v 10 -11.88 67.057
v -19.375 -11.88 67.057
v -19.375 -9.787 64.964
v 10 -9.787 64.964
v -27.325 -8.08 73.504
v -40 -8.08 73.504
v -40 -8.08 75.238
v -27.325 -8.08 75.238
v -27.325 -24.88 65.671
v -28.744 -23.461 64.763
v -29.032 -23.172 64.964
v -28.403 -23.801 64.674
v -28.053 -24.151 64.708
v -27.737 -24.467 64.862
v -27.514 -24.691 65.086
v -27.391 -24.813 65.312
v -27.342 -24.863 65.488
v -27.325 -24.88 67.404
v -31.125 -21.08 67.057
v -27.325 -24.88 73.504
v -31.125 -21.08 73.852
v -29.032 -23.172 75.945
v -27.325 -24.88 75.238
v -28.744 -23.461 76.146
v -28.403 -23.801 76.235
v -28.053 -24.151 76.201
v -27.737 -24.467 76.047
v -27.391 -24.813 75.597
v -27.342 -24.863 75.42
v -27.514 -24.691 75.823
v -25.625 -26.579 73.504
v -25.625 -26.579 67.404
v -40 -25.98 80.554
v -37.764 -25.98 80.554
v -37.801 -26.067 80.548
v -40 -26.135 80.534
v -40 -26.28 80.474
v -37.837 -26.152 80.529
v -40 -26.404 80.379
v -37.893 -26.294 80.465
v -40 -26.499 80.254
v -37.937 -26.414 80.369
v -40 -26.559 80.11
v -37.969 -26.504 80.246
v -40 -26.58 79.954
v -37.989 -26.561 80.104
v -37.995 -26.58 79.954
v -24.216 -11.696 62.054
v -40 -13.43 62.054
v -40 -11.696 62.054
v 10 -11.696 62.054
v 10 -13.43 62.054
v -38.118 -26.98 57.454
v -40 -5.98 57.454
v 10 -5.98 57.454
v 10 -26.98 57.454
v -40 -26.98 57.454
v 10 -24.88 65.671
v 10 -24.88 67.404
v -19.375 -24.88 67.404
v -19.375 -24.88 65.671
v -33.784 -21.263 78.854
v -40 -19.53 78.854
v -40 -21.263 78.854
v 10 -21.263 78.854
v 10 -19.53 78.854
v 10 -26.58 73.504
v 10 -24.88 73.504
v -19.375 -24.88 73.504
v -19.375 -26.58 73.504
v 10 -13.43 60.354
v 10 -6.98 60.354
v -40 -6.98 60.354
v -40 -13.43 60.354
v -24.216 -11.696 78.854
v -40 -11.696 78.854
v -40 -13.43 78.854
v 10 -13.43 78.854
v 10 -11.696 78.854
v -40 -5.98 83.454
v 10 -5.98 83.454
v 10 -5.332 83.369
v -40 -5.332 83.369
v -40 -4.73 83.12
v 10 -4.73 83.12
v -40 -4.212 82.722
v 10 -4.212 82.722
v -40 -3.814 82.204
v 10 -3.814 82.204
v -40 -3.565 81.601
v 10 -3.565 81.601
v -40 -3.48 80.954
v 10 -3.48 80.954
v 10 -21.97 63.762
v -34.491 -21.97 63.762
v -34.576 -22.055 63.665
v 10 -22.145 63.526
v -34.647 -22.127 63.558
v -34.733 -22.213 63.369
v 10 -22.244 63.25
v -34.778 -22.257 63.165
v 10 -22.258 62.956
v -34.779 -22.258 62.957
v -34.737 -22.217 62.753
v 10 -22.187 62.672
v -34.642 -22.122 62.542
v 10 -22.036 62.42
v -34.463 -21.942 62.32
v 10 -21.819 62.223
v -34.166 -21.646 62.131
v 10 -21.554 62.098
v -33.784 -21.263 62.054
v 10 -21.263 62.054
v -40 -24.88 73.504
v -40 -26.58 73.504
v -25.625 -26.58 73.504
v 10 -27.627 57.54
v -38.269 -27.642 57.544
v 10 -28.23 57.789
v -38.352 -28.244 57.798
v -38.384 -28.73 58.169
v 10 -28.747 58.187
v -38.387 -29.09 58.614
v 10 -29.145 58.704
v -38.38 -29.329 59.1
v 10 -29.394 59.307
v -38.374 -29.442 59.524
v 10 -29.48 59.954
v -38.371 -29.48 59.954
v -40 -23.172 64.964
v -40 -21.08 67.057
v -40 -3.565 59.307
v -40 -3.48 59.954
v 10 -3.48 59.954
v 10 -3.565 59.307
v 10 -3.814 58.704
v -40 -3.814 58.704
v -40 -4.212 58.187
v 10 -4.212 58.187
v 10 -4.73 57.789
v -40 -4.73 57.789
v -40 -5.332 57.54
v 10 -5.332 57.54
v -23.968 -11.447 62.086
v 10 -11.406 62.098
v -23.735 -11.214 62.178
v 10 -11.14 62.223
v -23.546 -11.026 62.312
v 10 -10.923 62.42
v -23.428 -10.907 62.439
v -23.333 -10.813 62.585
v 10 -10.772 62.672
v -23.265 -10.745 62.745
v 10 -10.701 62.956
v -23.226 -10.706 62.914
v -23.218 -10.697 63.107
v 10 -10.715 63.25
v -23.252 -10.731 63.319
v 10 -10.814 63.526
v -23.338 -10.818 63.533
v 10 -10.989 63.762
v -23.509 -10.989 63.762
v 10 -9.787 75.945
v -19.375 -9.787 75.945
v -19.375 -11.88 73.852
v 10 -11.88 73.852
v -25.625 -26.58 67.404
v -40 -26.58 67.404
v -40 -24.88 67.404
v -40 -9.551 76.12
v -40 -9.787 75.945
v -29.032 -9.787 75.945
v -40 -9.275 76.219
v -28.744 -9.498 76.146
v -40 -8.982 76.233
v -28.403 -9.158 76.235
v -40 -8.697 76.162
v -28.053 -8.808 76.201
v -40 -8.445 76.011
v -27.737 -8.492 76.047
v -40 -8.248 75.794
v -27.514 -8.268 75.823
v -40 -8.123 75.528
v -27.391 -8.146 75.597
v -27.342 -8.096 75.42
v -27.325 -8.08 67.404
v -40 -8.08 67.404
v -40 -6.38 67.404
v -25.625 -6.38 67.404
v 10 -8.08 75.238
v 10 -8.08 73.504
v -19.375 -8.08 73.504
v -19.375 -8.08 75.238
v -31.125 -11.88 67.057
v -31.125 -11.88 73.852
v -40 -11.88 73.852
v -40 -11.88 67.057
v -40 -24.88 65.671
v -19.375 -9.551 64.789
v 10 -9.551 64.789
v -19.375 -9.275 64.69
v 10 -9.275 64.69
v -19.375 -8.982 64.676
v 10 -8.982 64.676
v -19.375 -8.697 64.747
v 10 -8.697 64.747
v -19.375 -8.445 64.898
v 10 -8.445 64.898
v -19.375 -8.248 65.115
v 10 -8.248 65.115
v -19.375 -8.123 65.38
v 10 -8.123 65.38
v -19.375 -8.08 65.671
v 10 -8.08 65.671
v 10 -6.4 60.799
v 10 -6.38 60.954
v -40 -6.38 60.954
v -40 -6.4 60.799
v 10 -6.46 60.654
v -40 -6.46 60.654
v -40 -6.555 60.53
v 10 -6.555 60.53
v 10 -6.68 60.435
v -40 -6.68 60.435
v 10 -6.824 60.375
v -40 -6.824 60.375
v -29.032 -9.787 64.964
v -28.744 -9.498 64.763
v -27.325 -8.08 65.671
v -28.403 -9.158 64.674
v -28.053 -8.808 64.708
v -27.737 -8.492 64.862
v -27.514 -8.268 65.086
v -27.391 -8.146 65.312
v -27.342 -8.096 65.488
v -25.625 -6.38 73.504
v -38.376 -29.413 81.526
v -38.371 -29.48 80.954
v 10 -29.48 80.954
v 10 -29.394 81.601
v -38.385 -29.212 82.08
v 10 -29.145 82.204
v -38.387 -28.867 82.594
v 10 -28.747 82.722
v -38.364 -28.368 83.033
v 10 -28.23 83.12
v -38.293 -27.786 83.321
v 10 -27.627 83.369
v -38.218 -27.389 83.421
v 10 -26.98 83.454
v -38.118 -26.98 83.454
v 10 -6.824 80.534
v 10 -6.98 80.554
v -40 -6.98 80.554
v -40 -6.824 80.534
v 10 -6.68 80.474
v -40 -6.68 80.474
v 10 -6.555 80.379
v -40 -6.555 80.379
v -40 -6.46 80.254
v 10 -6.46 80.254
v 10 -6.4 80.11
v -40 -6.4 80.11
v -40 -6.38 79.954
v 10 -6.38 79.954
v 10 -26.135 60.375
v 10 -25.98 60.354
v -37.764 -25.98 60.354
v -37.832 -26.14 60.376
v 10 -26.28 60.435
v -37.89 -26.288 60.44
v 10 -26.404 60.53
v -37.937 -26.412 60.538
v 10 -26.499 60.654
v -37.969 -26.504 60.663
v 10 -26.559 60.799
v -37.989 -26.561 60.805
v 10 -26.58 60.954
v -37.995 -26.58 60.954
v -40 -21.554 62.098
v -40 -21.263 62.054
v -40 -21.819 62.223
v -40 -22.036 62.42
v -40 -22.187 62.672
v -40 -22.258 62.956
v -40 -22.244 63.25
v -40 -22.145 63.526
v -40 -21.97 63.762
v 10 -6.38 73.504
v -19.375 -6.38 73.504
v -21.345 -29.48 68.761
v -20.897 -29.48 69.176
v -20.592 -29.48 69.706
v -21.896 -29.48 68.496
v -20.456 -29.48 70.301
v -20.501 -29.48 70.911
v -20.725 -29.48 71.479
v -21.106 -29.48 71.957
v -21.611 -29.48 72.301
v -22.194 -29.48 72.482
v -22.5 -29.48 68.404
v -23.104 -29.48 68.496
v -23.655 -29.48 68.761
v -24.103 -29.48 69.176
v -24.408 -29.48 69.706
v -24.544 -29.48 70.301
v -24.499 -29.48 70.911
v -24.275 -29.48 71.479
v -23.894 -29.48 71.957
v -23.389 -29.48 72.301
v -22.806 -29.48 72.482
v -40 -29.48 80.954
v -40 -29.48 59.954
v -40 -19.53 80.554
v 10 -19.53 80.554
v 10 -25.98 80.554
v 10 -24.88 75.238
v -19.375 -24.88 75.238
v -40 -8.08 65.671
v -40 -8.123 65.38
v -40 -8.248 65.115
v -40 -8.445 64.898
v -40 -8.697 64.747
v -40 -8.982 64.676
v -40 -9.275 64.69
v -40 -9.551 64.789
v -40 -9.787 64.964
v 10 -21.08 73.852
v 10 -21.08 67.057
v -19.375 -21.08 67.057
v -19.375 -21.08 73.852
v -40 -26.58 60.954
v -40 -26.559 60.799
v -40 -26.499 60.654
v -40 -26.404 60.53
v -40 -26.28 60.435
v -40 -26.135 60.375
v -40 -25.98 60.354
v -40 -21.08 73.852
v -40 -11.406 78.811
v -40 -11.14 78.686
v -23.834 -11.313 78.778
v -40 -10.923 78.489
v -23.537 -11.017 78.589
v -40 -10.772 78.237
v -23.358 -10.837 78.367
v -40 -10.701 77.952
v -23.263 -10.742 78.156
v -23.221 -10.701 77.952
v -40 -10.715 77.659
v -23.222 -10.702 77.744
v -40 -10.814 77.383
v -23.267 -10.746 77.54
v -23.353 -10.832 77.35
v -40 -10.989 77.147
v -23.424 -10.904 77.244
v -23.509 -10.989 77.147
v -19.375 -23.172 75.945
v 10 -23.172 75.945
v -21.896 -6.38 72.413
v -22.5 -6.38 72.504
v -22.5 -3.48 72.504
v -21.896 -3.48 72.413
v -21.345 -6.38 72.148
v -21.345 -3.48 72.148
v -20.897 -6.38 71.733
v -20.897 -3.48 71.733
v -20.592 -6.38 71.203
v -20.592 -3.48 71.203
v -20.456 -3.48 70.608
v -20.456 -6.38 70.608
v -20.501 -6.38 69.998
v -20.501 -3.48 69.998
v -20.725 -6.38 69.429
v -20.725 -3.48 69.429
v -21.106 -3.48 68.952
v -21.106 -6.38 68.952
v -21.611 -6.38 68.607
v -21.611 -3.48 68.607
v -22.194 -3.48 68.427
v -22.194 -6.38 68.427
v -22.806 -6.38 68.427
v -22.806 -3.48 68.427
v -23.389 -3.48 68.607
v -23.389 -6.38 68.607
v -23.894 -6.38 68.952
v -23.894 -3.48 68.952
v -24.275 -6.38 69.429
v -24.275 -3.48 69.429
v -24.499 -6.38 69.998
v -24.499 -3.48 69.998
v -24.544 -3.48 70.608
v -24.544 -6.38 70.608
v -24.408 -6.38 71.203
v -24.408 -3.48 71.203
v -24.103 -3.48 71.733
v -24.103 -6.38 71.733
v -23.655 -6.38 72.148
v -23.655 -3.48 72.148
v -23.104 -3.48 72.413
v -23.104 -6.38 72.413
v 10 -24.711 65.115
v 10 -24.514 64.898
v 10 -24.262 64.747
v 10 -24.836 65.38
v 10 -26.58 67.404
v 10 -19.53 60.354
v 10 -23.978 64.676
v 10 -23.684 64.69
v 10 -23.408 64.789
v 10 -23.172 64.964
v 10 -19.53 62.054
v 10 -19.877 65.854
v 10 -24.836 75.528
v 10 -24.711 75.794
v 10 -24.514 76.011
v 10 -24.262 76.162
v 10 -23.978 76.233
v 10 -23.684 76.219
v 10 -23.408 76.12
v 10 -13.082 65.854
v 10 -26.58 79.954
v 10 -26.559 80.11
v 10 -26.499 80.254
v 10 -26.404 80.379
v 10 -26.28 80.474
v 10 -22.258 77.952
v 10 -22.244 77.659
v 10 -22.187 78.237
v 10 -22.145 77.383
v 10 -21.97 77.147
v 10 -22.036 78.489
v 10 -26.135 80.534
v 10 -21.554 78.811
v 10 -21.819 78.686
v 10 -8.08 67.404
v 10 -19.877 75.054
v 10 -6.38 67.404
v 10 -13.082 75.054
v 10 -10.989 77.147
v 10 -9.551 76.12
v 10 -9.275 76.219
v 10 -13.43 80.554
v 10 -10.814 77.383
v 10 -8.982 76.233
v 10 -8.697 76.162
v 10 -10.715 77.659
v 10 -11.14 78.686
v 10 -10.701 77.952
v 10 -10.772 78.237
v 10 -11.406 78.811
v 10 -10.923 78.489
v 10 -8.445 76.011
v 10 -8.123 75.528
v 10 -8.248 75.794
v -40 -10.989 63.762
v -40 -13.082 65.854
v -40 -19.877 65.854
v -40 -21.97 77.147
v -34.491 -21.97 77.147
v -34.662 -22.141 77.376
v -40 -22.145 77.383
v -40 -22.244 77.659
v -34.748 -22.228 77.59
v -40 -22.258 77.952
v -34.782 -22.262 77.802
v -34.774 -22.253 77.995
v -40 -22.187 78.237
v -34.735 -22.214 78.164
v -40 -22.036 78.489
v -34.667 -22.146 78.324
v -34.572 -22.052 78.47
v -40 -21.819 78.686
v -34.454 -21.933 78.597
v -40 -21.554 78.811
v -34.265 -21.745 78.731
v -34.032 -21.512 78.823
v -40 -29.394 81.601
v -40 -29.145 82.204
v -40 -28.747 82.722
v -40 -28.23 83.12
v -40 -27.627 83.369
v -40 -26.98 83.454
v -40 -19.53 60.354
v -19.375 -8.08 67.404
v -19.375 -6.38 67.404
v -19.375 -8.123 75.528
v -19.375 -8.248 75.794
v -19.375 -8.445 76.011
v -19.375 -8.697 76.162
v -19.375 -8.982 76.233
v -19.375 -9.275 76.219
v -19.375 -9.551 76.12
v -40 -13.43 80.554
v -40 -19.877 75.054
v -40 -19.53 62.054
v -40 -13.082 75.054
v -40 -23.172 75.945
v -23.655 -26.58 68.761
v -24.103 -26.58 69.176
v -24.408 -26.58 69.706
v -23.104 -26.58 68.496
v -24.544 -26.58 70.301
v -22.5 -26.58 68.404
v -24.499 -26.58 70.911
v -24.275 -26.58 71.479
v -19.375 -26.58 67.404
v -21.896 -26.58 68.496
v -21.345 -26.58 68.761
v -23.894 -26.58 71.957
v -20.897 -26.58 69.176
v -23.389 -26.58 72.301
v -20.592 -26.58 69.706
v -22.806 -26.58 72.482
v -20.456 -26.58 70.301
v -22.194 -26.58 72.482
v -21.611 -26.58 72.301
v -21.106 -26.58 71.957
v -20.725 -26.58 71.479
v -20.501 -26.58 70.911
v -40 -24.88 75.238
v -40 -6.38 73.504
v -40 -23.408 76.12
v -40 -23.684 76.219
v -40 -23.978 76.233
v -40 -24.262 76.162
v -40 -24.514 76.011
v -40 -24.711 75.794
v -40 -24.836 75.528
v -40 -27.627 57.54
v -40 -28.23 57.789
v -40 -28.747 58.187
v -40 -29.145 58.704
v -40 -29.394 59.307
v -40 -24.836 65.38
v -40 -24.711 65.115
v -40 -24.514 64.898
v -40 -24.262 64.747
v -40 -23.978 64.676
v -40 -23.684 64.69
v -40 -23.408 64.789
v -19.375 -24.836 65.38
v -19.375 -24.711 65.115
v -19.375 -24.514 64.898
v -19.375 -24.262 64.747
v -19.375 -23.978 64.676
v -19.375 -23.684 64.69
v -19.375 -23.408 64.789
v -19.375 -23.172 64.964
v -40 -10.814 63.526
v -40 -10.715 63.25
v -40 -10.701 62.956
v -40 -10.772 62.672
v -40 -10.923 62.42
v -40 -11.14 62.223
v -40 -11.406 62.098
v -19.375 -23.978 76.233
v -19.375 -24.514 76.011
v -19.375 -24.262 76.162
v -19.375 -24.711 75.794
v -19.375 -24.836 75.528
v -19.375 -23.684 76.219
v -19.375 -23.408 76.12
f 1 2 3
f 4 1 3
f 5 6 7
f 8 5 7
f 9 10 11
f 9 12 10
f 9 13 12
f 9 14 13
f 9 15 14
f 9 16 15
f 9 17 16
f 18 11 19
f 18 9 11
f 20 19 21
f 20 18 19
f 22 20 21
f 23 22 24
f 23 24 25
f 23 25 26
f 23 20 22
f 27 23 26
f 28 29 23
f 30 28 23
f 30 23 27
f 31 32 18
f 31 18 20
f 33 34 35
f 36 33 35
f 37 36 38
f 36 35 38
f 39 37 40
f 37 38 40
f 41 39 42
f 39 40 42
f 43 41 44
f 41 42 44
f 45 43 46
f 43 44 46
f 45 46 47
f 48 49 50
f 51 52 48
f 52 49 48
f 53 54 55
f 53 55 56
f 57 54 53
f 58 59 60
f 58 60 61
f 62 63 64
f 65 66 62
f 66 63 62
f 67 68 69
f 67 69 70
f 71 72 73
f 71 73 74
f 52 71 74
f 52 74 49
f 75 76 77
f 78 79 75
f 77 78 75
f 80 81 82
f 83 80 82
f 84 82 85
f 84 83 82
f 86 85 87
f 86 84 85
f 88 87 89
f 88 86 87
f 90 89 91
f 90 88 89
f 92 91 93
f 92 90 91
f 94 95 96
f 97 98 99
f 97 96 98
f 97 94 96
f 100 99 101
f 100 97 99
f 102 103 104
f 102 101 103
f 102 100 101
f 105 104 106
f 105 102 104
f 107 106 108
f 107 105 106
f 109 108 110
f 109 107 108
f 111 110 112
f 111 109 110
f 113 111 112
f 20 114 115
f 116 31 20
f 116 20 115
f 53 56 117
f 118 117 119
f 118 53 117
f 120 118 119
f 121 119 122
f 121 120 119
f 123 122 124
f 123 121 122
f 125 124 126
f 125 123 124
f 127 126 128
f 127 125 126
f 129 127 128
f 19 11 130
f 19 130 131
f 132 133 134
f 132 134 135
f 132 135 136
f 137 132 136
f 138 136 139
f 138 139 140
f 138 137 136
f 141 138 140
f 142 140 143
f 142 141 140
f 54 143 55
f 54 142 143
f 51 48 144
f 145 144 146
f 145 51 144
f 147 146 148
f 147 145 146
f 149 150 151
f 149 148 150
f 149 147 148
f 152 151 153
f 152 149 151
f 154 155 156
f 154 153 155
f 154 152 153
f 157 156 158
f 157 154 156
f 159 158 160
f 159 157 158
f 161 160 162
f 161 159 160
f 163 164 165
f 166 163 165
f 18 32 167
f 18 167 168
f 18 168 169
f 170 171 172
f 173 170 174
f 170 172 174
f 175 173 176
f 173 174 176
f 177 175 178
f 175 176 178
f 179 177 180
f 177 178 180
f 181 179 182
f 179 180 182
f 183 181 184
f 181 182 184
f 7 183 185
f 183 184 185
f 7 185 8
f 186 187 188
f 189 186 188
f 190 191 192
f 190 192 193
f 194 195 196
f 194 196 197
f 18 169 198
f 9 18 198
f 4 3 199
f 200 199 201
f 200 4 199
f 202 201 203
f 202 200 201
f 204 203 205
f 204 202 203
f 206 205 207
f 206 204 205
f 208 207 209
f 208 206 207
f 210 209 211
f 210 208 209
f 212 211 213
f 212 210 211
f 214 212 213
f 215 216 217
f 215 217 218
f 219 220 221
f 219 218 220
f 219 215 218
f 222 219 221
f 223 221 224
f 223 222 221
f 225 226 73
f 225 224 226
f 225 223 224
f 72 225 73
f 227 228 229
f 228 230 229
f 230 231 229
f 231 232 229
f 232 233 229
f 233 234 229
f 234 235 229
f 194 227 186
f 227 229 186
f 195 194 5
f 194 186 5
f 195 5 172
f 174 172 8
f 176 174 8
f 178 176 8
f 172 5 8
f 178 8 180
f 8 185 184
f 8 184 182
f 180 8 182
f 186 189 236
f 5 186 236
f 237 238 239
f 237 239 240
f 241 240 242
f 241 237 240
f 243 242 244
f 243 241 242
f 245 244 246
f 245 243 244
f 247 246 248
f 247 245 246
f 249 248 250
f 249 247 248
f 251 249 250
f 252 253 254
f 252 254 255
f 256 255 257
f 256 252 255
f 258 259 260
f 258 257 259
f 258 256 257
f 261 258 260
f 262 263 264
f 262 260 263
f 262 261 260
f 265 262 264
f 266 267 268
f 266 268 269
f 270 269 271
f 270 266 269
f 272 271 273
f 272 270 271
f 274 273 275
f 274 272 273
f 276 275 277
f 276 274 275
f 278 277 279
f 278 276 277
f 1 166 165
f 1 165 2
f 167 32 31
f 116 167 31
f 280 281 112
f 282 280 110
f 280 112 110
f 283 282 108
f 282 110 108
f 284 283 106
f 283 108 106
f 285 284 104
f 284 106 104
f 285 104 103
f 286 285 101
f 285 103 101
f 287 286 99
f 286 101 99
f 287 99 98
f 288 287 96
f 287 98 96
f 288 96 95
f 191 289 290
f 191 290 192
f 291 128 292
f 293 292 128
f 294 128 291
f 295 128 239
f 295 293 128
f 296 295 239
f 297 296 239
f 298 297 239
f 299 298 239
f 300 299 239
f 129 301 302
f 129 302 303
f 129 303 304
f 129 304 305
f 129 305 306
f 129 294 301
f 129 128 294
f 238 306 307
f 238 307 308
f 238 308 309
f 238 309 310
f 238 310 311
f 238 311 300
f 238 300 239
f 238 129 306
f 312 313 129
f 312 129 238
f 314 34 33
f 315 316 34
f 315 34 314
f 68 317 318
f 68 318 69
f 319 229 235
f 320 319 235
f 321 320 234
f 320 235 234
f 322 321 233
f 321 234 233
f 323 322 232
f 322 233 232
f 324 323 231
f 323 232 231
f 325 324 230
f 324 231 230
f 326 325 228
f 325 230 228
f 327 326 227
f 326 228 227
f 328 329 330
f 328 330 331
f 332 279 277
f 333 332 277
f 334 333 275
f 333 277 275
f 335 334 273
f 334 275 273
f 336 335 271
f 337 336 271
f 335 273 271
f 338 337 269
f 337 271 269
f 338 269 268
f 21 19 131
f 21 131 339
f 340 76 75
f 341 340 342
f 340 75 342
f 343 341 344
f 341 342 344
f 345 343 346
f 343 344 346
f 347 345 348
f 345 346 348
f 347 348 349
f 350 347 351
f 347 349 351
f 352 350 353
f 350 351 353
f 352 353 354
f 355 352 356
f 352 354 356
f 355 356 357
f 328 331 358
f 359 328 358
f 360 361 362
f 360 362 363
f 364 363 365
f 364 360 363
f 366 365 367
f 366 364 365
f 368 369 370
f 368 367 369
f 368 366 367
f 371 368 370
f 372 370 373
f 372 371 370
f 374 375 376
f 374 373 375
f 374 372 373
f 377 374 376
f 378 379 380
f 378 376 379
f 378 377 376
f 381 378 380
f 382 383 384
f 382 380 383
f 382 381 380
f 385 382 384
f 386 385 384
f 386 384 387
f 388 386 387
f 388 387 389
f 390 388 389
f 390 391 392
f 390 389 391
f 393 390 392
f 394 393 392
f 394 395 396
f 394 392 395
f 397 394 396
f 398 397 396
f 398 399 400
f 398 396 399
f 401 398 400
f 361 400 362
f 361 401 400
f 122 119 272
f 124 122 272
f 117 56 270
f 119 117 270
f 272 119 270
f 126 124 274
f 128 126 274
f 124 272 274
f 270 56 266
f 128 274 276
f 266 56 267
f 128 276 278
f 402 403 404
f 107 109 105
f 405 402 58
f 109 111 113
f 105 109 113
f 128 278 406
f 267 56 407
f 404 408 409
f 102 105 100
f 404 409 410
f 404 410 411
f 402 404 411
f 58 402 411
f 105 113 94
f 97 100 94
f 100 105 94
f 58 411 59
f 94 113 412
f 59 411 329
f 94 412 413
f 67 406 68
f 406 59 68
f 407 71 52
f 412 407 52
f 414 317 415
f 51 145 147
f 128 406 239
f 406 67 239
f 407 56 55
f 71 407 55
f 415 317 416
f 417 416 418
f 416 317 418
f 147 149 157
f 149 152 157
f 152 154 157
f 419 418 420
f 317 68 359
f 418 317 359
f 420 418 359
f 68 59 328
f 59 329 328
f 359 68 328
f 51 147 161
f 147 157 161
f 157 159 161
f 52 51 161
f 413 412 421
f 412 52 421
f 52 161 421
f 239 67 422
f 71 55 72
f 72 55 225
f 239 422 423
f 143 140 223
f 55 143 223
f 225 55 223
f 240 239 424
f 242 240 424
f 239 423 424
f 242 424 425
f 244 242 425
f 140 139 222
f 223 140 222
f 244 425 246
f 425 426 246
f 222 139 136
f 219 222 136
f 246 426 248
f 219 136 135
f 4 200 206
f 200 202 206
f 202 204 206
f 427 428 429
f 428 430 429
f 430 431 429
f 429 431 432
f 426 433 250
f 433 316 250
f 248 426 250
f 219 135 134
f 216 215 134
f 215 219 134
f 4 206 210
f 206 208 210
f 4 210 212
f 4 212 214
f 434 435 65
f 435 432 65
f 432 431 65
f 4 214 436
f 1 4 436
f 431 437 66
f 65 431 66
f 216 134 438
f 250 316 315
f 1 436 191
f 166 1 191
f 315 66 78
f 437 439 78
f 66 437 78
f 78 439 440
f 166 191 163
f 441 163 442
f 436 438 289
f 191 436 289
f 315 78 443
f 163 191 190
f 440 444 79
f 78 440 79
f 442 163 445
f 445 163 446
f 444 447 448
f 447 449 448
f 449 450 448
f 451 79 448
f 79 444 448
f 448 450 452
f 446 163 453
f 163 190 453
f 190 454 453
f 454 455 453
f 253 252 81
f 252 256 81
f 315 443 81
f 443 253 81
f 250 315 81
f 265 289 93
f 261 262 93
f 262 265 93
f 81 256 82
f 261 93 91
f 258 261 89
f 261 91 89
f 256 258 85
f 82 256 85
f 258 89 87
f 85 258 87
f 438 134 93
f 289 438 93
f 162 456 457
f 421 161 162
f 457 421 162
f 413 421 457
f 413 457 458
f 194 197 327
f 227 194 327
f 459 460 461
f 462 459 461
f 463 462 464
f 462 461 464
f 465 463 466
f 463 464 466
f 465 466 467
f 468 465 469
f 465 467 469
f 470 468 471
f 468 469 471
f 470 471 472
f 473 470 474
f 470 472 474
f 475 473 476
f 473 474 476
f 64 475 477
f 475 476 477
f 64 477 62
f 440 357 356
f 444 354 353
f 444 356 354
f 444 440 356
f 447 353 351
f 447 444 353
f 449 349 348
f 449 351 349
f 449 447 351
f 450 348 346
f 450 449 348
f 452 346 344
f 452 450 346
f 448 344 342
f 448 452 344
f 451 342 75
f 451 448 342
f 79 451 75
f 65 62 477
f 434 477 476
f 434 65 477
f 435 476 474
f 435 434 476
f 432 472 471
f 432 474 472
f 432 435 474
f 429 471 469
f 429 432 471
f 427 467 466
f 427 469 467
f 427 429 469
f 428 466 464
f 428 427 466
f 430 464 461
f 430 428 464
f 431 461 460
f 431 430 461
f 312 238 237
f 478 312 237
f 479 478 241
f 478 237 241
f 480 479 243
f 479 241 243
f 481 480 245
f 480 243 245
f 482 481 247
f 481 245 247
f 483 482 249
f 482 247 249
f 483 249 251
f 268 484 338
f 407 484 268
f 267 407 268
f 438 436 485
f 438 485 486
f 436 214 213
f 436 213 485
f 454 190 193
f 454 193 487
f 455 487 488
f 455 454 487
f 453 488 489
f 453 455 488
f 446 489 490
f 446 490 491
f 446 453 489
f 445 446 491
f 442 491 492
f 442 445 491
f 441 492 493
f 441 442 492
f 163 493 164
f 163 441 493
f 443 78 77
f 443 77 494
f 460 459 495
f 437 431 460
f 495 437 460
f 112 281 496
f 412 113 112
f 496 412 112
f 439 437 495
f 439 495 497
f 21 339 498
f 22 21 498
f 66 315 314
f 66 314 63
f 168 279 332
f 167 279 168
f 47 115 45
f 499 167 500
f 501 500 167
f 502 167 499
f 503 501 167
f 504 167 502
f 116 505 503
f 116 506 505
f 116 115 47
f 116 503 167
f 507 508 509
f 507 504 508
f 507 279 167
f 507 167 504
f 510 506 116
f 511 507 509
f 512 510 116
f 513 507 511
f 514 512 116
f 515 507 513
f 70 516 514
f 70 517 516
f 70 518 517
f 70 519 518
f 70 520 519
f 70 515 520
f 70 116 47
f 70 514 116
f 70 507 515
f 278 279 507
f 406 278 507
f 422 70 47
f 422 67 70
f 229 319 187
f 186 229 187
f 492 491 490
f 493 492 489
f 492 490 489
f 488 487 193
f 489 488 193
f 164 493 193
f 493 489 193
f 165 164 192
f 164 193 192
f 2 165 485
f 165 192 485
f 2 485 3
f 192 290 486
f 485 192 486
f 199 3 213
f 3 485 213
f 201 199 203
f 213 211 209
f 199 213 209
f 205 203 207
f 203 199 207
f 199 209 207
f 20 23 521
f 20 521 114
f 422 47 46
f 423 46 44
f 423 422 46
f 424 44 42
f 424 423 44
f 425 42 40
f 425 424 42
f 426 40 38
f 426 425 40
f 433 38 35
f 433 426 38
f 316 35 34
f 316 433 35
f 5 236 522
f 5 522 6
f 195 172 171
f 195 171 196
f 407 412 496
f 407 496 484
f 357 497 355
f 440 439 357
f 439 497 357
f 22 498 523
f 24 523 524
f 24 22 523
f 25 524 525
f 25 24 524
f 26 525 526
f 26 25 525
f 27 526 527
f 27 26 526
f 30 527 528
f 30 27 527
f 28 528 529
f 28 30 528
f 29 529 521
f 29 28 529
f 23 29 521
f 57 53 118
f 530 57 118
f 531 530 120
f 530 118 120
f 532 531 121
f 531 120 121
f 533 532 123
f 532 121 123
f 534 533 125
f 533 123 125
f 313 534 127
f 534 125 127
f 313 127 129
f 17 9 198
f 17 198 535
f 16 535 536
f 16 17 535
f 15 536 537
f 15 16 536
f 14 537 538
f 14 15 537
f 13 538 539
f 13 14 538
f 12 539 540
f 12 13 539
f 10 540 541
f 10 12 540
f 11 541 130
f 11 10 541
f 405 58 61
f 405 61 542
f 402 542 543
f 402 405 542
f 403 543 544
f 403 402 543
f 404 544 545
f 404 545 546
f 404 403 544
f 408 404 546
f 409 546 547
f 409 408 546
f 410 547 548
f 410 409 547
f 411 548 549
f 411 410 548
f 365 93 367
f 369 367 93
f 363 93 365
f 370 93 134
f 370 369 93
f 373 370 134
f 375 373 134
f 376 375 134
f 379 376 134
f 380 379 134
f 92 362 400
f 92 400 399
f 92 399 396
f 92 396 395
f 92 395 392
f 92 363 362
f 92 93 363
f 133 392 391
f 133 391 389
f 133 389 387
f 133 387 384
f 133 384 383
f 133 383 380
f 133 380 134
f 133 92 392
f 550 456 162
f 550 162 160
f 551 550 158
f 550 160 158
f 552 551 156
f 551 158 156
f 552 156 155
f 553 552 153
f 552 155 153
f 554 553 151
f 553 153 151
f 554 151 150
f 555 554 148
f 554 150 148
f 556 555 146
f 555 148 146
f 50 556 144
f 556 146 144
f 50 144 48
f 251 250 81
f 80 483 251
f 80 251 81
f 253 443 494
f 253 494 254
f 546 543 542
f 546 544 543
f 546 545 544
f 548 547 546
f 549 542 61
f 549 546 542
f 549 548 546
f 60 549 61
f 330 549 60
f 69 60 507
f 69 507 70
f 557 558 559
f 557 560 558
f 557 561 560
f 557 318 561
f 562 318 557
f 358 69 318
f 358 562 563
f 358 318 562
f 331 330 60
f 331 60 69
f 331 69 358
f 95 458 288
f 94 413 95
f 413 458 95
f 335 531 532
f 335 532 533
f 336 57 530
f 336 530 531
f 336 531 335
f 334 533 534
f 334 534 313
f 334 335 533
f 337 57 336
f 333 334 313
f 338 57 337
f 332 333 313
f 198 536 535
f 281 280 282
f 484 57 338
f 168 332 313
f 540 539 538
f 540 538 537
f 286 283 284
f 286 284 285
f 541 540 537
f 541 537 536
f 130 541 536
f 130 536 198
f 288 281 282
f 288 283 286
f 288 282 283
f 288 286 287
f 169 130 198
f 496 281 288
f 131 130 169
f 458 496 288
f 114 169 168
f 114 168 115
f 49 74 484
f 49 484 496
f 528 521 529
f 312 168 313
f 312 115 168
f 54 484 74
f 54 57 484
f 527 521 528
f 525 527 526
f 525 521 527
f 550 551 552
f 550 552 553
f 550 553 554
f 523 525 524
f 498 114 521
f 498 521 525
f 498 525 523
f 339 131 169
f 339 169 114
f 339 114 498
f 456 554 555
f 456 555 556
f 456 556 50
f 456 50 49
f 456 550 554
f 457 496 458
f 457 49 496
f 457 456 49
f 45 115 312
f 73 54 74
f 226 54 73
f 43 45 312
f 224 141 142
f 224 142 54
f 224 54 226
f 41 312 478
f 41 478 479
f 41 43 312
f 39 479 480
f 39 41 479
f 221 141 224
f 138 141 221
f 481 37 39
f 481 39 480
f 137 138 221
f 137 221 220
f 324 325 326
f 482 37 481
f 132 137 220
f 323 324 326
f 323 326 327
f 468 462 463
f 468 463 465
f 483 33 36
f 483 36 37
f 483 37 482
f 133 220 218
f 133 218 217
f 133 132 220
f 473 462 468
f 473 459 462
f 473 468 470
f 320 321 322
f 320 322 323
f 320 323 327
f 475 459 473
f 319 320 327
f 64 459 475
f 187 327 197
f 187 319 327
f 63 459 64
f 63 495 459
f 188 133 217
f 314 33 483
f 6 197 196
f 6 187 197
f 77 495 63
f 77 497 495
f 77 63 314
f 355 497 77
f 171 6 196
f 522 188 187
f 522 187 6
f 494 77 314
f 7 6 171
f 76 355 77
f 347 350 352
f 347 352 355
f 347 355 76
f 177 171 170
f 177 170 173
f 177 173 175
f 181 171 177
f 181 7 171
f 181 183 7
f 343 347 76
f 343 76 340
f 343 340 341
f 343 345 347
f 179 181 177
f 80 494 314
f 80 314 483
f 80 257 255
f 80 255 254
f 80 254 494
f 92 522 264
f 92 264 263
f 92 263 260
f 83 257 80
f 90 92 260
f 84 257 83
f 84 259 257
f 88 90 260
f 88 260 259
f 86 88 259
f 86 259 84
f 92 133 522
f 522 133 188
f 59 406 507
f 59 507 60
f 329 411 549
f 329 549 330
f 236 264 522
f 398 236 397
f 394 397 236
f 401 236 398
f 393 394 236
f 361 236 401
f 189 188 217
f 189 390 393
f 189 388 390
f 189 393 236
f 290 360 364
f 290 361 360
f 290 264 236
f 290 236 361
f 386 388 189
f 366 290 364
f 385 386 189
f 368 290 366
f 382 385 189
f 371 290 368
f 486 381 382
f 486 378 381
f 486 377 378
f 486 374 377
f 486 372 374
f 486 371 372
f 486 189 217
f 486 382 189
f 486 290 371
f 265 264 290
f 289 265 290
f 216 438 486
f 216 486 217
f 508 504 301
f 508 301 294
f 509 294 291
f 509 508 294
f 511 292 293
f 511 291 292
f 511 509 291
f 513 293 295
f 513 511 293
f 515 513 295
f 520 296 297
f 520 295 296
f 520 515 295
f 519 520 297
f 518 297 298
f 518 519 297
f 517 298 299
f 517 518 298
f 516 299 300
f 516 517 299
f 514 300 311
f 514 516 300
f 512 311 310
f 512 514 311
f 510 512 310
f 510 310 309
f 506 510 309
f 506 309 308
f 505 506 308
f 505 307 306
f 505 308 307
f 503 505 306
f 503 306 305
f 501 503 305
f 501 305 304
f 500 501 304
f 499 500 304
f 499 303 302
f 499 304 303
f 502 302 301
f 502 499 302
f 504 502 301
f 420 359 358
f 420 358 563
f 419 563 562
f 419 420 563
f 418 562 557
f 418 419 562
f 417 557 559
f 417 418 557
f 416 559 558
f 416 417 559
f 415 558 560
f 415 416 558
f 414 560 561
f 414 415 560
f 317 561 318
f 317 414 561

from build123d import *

# Parameters (mm, degrees)
BOSS_EXTRUDE1_DEPTH      = 39
BOSS_EXTRUDE1_DEPTH_BACK = 10
SKETCH1_W                = 42
SKETCH1_H                = 40
CUT_EXTRUDE3_DEPTH       = 68.939361812
CUT_EXTRUDE3_DEPTH_BACK  = 68.939361812
BOSS_EXTRUDE2_DEPTH      = 40
CUT_EXTRUDE7_START       = -10
SKETCH7_R                = 2.05
CUT_EXTRUDE7_DEPTH       = 116.132850877
CUT_EXTRUDE8_DEPTH       = 3.125
SKETCH9_R                = 2.778089848
BOSS_EXTRUDE3_DEPTH      = 6
CIRPATTERN1_COUNT        = 2
SKETCH10_W               = 6.985924482
SKETCH10_H               = 7.120269183
CUT_EXTRUDE13_DEPTH      = 8
SKETCH14_OUTSIDE_W       = 59.316
SKETCH14_OUTSIDE_H       = 57.316
CUT_EXTRUDE14_DEPTH      = 111.429494292
CHAMFER1_SIZE            = 5.5


with BuildPart() as part:
    # Sketch1 → Boss-Extrude1 (new, two sides: drawn at the far end of the back side and taken through both)
    with BuildSketch(Plane.ZY.offset(-BOSS_EXTRUDE1_DEPTH_BACK)):
        with Locations((70.454449321, -16.479540615)):
            Rectangle(SKETCH1_W, SKETCH1_H)
        with BuildLine():
            Line((77.147342539, -21.970352305), (75.054449321, -19.877459087))
            Line((75.054449321, -19.877459087), (75.054449321, -13.081622143))
            Line((75.054449321, -13.081622143), (77.147342539, -10.988728924))
            ThreePointArc((77.147342539, -10.988728924), (78.237132753, -10.771956173), (78.854449321, -11.695835705))
            Line((78.854449321, -11.695835705), (78.854449321, -13.429540615))
            Line((78.854449321, -13.429540615), (80.554449321, -13.429540615))
            Line((80.554449321, -13.429540615), (80.554449321, -6.979540615))
            ThreePointArc((80.554449321, -6.979540615), (80.378713389, -6.555276546), (79.954449321, -6.379540615))
            Line((79.954449321, -6.379540615), (73.504449321, -6.379540615))
            Line((73.504449321, -6.379540615), (73.504449321, -8.079540615))
            Line((73.504449321, -8.079540615), (75.23815423, -8.079540615))
            ThreePointArc((75.23815423, -8.079540615), (76.162033763, -8.696857182), (75.945261011, -9.786647396))
            Line((75.945261011, -9.786647396), (73.852367793, -11.879540615))
            Line((73.852367793, -11.879540615), (67.056530849, -11.879540615))
            Line((67.056530849, -11.879540615), (64.96363763, -9.786647396))
            ThreePointArc((64.96363763, -9.786647396), (64.746864878, -8.696857182), (65.670744411, -8.079540615))
            Line((65.670744411, -8.079540615), (67.404449321, -8.079540615))
            Line((67.404449321, -8.079540615), (67.404449321, -6.379540615))
            Line((67.404449321, -6.379540615), (60.954449321, -6.379540615))
            ThreePointArc((60.954449321, -6.379540615), (60.530185252, -6.555276546), (60.354449321, -6.979540615))
            Line((60.354449321, -6.979540615), (60.354449321, -13.429540615))
            Line((60.354449321, -13.429540615), (62.054449321, -13.429540615))
            Line((62.054449321, -13.429540615), (62.054449321, -11.695835705))
            ThreePointArc((62.054449321, -11.695835705), (62.671765888, -10.771956173), (63.761556102, -10.988728924))
            Line((63.761556102, -10.988728924), (65.854449321, -13.081622143))
            Line((65.854449321, -13.081622143), (65.854449321, -19.877459087))
            Line((65.854449321, -19.877459087), (63.761556102, -21.970352305))
            ThreePointArc((63.761556102, -21.970352305), (62.671765888, -22.187125057), (62.054449321, -21.263245524))
            Line((62.054449321, -21.263245524), (62.054449321, -19.529540615))
            Line((62.054449321, -19.529540615), (60.354449321, -19.529540615))
            Line((60.354449321, -19.529540615), (60.354449321, -25.979540615))
            ThreePointArc((60.354449321, -25.979540615), (60.530185252, -26.403804683), (60.954449321, -26.579540615))
            Line((60.954449321, -26.579540615), (67.404449321, -26.579540615))
            Line((67.404449321, -26.579540615), (67.404449321, -24.879540615))
            Line((67.404449321, -24.879540615), (65.670744411, -24.879540615))
            ThreePointArc((65.670744411, -24.879540615), (64.746864878, -24.262224047), (64.96363763, -23.172433833))
            Line((64.96363763, -23.172433833), (67.056530849, -21.079540615))
            Line((67.056530849, -21.079540615), (73.852367793, -21.079540615))
            Line((73.852367793, -21.079540615), (75.945261011, -23.172433833))
            ThreePointArc((75.945261011, -23.172433833), (76.162033763, -24.262224047), (75.23815423, -24.879540615))
            Line((75.23815423, -24.879540615), (73.504449321, -24.879540615))
            Line((73.504449321, -24.879540615), (73.504449321, -26.579540615))
            Line((73.504449321, -26.579540615), (79.954449321, -26.579540615))
            ThreePointArc((79.954449321, -26.579540615), (80.378713389, -26.403804683), (80.554449321, -25.979540615))
            Line((80.554449321, -25.979540615), (80.554449321, -19.529540615))
            Line((80.554449321, -19.529540615), (78.854449321, -19.529540615))
            Line((78.854449321, -19.529540615), (78.854449321, -21.263245524))
            ThreePointArc((78.854449321, -21.263245524), (78.237132753, -22.187125057), (77.147342539, -21.970352305))
        make_face(mode=Mode.SUBTRACT)
    extrude(amount=BOSS_EXTRUDE1_DEPTH + BOSS_EXTRUDE1_DEPTH_BACK)

    # Sketch2 → Cut-Extrude3 (cut, two sides: drawn at the far end of the back side and taken through both)
    with BuildSketch(Plane(origin=(0, 0, 91.454449321), x_dir=(-1, 0, 0), z_dir=(0, 0, -1)).offset(-CUT_EXTRUDE3_DEPTH_BACK)):
        with BuildLine():
            Line((9, 3.520459385), (39, 3.520459385))
            Line((39, 3.520459385), (39, -36.479540615))
            Line((39, -36.479540615), (30.968670474, -36.479540615))
            ThreePointArc((30.968670474, -36.479540615), (30.884335237, -36.480014542), (30.8, -36.479540615))
            Line((30.8, -36.479540615), (30.8, -37.552822487))
            Line((30.8, -37.552822487), (41.446354872, -37.552822487))
            Line((41.446354872, -37.552822487), (41.446354872, 6.899861608))
            Line((41.446354872, 6.899861608), (9, 6.899861608))
            Line((9, 6.899861608), (9, 3.520459385))
        make_face()
        with BuildLine():
            Line((39, -36.479540615), (39, 3.520459385))
            Line((39, 3.520459385), (9, 3.520459385))
            Line((9, 3.520459385), (36.19042941, -23.669970025))
            ThreePointArc((36.19042941, -23.669970025), (37.833109012, -31.808697916), (30.968670474, -36.479540615))
            Line((30.968670474, -36.479540615), (39, -36.479540615))
        make_face()
    extrude(amount=CUT_EXTRUDE3_DEPTH + CUT_EXTRUDE3_DEPTH_BACK, mode=Mode.SUBTRACT)

    # Sketch4 → Boss-Extrude2 (add)
    with BuildSketch(Plane(origin=(0, 0, 0), x_dir=(0, 0, -1), z_dir=(1, 0, 0))):
        with BuildLine():
            Line((-80.954449321, -3.479540615), (-59.954449321, -3.479540615))
            ThreePointArc((-59.954449321, -3.479540615), (-58.186682368, -4.211773662), (-57.454449321, -5.979540615))
            Line((-57.454449321, -5.979540615), (-57.454449321, -26.979540615))
            ThreePointArc((-57.454449321, -26.979540615), (-58.186682368, -28.747307568), (-59.954449321, -29.479540615))
            Line((-59.954449321, -29.479540615), (-80.954449321, -29.479540615))
            ThreePointArc((-80.954449321, -29.479540615), (-82.722216274, -28.747307568), (-83.454449321, -26.979540615))
            Line((-83.454449321, -26.979540615), (-83.454449321, -5.979540615))
            ThreePointArc((-83.454449321, -5.979540615), (-82.722216274, -4.211773662), (-80.954449321, -3.479540615))
        make_face()
        with BuildLine():
            Line((-62.054449321, -11.695835705), (-62.054449321, -13.429540615))
            Line((-62.054449321, -13.429540615), (-60.354449321, -13.429540615))
            Line((-60.354449321, -13.429540615), (-60.354449321, -6.979540615))
            ThreePointArc((-60.354449321, -6.979540615), (-60.530185252, -6.555276546), (-60.954449321, -6.379540615))
            Line((-60.954449321, -6.379540615), (-67.404449321, -6.379540615))
            Line((-67.404449321, -6.379540615), (-67.404449321, -8.079540615))
            Line((-67.404449321, -8.079540615), (-65.670744411, -8.079540615))
            ThreePointArc((-65.670744411, -8.079540615), (-64.746864878, -8.696857182), (-64.96363763, -9.786647396))
            Line((-64.96363763, -9.786647396), (-67.056530849, -11.879540615))
            Line((-67.056530849, -11.879540615), (-73.852367793, -11.879540615))
            Line((-73.852367793, -11.879540615), (-75.945261011, -9.786647396))
            ThreePointArc((-75.945261011, -9.786647396), (-76.162033763, -8.696857182), (-75.23815423, -8.079540615))
            Line((-75.23815423, -8.079540615), (-73.504449321, -8.079540615))
            Line((-73.504449321, -8.079540615), (-73.504449321, -6.379540615))
            Line((-73.504449321, -6.379540615), (-79.954449321, -6.379540615))
            ThreePointArc((-79.954449321, -6.379540615), (-80.378713389, -6.555276546), (-80.554449321, -6.979540615))
            Line((-80.554449321, -6.979540615), (-80.554449321, -13.429540615))
            Line((-80.554449321, -13.429540615), (-78.854449321, -13.429540615))
            Line((-78.854449321, -13.429540615), (-78.854449321, -11.695835705))
            ThreePointArc((-78.854449321, -11.695835705), (-78.237132753, -10.771956173), (-77.147342539, -10.988728924))
            Line((-77.147342539, -10.988728924), (-75.054449321, -13.081622143))
            Line((-75.054449321, -13.081622143), (-75.054449321, -19.877459087))
            Line((-75.054449321, -19.877459087), (-77.147342539, -21.970352305))
            ThreePointArc((-77.147342539, -21.970352305), (-78.237132753, -22.187125057), (-78.854449321, -21.263245524))
            Line((-78.854449321, -21.263245524), (-78.854449321, -19.529540615))
            Line((-78.854449321, -19.529540615), (-80.554449321, -19.529540615))
            Line((-80.554449321, -19.529540615), (-80.554449321, -25.979540615))
            ThreePointArc((-80.554449321, -25.979540615), (-80.378713389, -26.403804683), (-79.954449321, -26.579540615))
            Line((-79.954449321, -26.579540615), (-73.504449321, -26.579540615))
            Line((-73.504449321, -26.579540615), (-73.504449321, -24.879540615))
            Line((-73.504449321, -24.879540615), (-75.23815423, -24.879540615))
            ThreePointArc((-75.23815423, -24.879540615), (-76.162033763, -24.262224047), (-75.945261011, -23.172433833))
            Line((-75.945261011, -23.172433833), (-73.852367793, -21.079540615))
            Line((-73.852367793, -21.079540615), (-67.056530849, -21.079540615))
            Line((-67.056530849, -21.079540615), (-64.96363763, -23.172433833))
            ThreePointArc((-64.96363763, -23.172433833), (-64.746864878, -24.262224047), (-65.670744411, -24.879540615))
            Line((-65.670744411, -24.879540615), (-67.404449321, -24.879540615))
            Line((-67.404449321, -24.879540615), (-67.404449321, -26.579540615))
            Line((-67.404449321, -26.579540615), (-60.954449321, -26.579540615))
            ThreePointArc((-60.954449321, -26.579540615), (-60.530185252, -26.403804683), (-60.354449321, -25.979540615))
            Line((-60.354449321, -25.979540615), (-60.354449321, -19.529540615))
            Line((-60.354449321, -19.529540615), (-62.054449321, -19.529540615))
            Line((-62.054449321, -19.529540615), (-62.054449321, -21.263245524))
            ThreePointArc((-62.054449321, -21.263245524), (-62.671765888, -22.187125057), (-63.761556102, -21.970352305))
            Line((-63.761556102, -21.970352305), (-65.854449321, -19.877459087))
            Line((-65.854449321, -19.877459087), (-65.854449321, -13.081622143))
            Line((-65.854449321, -13.081622143), (-63.761556102, -10.988728924))
            ThreePointArc((-63.761556102, -10.988728924), (-62.671765888, -10.771956173), (-62.054449321, -11.695835705))
        make_face(mode=Mode.SUBTRACT)
    extrude(amount=-BOSS_EXTRUDE2_DEPTH)

    # Sketch7 → Cut-Extrude7 (cut)
    with BuildSketch(Plane(origin=(0, -3.479540615, 0), x_dir=(1, 0, 0), z_dir=(0, 1, 0)).offset(CUT_EXTRUDE7_START)):
        with Locations(Location((-22.5, -70.454449321, 0), (0, 0, 270))):
            Circle(SKETCH7_R)
    cut_extrude7 = extrude(amount=CUT_EXTRUDE7_DEPTH, mode=Mode.SUBTRACT)

    # Sketch8 → Cut-Extrude8 (cut, symmetric)
    with BuildSketch(Plane.ZY.offset(22.5)):
        Polygon((60.954449321, -6.379540615), (79.954449321, -6.379540615), (70.690797066, -16.49195704), align=None)
        Polygon((70.690797066, -16.49195704), (60.954449321, -26.579540615), (79.954449321, -26.579540615), align=None)
    extrude(amount=CUT_EXTRUDE8_DEPTH, both=True, mode=Mode.SUBTRACT)

    # CirPattern1: Cut-Extrude7 ×2 about axis
    cirpattern1_axis = Axis((-34, -16.479540615, 70.454449321), (-1, 0, 0))
    for i in range(1, CIRPATTERN1_COUNT):
        add(cut_extrude7.rotate(cirpattern1_axis, i * 360 / CIRPATTERN1_COUNT), mode=Mode.SUBTRACT)

    # Sketch14 outside → Cut-Extrude14 (cut, through all)
    with BuildSketch(Plane.ZY.offset(40)):
        with Locations((70.454, -16.48)):
            Rectangle(SKETCH14_OUTSIDE_W, SKETCH14_OUTSIDE_H)
        with BuildLine():
            Line((59.954449321, -29.479540615), (80.954449321, -29.479540615))
            ThreePointArc((80.954449321, -29.479540615), (82.722216274, -28.747307568), (83.454449321, -26.979540615))
            Line((83.454449321, -26.979540615), (83.454449321, -5.979540615))
            ThreePointArc((83.454449321, -5.979540615), (82.722216274, -4.211773662), (80.954449321, -3.479540615))
            Line((80.954449321, -3.479540615), (59.954449321, -3.479540615))
            ThreePointArc((59.954449321, -3.479540615), (58.186682368, -4.211773662), (57.454449321, -5.979540615))
            Line((57.454449321, -5.979540615), (57.454449321, -26.979540615))
            ThreePointArc((57.454449321, -26.979540615), (58.186682368, -28.747307568), (59.954449321, -29.479540615))
        make_face(mode=Mode.SUBTRACT)
    extrude(amount=-CUT_EXTRUDE14_DEPTH, mode=Mode.SUBTRACT)

    # Chamfer1
    chamfer1_edges = [part.edges().sort_by_distance(p)[0] for p in [
        (-25.625, -11.879540615, 70.454449321),
        (-25.625, -21.079540615, 70.454449321),
    ]]
    chamfer(chamfer1_edges, length=CHAMFER1_SIZE - 0.0001)  # a hair under: the kernel refuses the full size


with BuildPart() as body_2:
    # Sketch9 → Boss-Extrude3 (new body)
    with BuildSketch(Plane.ZY.offset(40)):
        with Locations((70.454449321, -16.479540615)):
            Circle(SKETCH9_R)
    extrude(amount=-BOSS_EXTRUDE3_DEPTH)

    # Sketch10 → Cut-Extrude13 (cut, symmetric)
    with BuildSketch(Plane.ZY.offset(40)):
        with Locations((70.605937199, -16.255142793)):
            Rectangle(SKETCH10_W, SKETCH10_H)
    extrude(amount=CUT_EXTRUDE13_DEPTH, both=True, mode=Mode.SUBTRACT)


solid = part.part
